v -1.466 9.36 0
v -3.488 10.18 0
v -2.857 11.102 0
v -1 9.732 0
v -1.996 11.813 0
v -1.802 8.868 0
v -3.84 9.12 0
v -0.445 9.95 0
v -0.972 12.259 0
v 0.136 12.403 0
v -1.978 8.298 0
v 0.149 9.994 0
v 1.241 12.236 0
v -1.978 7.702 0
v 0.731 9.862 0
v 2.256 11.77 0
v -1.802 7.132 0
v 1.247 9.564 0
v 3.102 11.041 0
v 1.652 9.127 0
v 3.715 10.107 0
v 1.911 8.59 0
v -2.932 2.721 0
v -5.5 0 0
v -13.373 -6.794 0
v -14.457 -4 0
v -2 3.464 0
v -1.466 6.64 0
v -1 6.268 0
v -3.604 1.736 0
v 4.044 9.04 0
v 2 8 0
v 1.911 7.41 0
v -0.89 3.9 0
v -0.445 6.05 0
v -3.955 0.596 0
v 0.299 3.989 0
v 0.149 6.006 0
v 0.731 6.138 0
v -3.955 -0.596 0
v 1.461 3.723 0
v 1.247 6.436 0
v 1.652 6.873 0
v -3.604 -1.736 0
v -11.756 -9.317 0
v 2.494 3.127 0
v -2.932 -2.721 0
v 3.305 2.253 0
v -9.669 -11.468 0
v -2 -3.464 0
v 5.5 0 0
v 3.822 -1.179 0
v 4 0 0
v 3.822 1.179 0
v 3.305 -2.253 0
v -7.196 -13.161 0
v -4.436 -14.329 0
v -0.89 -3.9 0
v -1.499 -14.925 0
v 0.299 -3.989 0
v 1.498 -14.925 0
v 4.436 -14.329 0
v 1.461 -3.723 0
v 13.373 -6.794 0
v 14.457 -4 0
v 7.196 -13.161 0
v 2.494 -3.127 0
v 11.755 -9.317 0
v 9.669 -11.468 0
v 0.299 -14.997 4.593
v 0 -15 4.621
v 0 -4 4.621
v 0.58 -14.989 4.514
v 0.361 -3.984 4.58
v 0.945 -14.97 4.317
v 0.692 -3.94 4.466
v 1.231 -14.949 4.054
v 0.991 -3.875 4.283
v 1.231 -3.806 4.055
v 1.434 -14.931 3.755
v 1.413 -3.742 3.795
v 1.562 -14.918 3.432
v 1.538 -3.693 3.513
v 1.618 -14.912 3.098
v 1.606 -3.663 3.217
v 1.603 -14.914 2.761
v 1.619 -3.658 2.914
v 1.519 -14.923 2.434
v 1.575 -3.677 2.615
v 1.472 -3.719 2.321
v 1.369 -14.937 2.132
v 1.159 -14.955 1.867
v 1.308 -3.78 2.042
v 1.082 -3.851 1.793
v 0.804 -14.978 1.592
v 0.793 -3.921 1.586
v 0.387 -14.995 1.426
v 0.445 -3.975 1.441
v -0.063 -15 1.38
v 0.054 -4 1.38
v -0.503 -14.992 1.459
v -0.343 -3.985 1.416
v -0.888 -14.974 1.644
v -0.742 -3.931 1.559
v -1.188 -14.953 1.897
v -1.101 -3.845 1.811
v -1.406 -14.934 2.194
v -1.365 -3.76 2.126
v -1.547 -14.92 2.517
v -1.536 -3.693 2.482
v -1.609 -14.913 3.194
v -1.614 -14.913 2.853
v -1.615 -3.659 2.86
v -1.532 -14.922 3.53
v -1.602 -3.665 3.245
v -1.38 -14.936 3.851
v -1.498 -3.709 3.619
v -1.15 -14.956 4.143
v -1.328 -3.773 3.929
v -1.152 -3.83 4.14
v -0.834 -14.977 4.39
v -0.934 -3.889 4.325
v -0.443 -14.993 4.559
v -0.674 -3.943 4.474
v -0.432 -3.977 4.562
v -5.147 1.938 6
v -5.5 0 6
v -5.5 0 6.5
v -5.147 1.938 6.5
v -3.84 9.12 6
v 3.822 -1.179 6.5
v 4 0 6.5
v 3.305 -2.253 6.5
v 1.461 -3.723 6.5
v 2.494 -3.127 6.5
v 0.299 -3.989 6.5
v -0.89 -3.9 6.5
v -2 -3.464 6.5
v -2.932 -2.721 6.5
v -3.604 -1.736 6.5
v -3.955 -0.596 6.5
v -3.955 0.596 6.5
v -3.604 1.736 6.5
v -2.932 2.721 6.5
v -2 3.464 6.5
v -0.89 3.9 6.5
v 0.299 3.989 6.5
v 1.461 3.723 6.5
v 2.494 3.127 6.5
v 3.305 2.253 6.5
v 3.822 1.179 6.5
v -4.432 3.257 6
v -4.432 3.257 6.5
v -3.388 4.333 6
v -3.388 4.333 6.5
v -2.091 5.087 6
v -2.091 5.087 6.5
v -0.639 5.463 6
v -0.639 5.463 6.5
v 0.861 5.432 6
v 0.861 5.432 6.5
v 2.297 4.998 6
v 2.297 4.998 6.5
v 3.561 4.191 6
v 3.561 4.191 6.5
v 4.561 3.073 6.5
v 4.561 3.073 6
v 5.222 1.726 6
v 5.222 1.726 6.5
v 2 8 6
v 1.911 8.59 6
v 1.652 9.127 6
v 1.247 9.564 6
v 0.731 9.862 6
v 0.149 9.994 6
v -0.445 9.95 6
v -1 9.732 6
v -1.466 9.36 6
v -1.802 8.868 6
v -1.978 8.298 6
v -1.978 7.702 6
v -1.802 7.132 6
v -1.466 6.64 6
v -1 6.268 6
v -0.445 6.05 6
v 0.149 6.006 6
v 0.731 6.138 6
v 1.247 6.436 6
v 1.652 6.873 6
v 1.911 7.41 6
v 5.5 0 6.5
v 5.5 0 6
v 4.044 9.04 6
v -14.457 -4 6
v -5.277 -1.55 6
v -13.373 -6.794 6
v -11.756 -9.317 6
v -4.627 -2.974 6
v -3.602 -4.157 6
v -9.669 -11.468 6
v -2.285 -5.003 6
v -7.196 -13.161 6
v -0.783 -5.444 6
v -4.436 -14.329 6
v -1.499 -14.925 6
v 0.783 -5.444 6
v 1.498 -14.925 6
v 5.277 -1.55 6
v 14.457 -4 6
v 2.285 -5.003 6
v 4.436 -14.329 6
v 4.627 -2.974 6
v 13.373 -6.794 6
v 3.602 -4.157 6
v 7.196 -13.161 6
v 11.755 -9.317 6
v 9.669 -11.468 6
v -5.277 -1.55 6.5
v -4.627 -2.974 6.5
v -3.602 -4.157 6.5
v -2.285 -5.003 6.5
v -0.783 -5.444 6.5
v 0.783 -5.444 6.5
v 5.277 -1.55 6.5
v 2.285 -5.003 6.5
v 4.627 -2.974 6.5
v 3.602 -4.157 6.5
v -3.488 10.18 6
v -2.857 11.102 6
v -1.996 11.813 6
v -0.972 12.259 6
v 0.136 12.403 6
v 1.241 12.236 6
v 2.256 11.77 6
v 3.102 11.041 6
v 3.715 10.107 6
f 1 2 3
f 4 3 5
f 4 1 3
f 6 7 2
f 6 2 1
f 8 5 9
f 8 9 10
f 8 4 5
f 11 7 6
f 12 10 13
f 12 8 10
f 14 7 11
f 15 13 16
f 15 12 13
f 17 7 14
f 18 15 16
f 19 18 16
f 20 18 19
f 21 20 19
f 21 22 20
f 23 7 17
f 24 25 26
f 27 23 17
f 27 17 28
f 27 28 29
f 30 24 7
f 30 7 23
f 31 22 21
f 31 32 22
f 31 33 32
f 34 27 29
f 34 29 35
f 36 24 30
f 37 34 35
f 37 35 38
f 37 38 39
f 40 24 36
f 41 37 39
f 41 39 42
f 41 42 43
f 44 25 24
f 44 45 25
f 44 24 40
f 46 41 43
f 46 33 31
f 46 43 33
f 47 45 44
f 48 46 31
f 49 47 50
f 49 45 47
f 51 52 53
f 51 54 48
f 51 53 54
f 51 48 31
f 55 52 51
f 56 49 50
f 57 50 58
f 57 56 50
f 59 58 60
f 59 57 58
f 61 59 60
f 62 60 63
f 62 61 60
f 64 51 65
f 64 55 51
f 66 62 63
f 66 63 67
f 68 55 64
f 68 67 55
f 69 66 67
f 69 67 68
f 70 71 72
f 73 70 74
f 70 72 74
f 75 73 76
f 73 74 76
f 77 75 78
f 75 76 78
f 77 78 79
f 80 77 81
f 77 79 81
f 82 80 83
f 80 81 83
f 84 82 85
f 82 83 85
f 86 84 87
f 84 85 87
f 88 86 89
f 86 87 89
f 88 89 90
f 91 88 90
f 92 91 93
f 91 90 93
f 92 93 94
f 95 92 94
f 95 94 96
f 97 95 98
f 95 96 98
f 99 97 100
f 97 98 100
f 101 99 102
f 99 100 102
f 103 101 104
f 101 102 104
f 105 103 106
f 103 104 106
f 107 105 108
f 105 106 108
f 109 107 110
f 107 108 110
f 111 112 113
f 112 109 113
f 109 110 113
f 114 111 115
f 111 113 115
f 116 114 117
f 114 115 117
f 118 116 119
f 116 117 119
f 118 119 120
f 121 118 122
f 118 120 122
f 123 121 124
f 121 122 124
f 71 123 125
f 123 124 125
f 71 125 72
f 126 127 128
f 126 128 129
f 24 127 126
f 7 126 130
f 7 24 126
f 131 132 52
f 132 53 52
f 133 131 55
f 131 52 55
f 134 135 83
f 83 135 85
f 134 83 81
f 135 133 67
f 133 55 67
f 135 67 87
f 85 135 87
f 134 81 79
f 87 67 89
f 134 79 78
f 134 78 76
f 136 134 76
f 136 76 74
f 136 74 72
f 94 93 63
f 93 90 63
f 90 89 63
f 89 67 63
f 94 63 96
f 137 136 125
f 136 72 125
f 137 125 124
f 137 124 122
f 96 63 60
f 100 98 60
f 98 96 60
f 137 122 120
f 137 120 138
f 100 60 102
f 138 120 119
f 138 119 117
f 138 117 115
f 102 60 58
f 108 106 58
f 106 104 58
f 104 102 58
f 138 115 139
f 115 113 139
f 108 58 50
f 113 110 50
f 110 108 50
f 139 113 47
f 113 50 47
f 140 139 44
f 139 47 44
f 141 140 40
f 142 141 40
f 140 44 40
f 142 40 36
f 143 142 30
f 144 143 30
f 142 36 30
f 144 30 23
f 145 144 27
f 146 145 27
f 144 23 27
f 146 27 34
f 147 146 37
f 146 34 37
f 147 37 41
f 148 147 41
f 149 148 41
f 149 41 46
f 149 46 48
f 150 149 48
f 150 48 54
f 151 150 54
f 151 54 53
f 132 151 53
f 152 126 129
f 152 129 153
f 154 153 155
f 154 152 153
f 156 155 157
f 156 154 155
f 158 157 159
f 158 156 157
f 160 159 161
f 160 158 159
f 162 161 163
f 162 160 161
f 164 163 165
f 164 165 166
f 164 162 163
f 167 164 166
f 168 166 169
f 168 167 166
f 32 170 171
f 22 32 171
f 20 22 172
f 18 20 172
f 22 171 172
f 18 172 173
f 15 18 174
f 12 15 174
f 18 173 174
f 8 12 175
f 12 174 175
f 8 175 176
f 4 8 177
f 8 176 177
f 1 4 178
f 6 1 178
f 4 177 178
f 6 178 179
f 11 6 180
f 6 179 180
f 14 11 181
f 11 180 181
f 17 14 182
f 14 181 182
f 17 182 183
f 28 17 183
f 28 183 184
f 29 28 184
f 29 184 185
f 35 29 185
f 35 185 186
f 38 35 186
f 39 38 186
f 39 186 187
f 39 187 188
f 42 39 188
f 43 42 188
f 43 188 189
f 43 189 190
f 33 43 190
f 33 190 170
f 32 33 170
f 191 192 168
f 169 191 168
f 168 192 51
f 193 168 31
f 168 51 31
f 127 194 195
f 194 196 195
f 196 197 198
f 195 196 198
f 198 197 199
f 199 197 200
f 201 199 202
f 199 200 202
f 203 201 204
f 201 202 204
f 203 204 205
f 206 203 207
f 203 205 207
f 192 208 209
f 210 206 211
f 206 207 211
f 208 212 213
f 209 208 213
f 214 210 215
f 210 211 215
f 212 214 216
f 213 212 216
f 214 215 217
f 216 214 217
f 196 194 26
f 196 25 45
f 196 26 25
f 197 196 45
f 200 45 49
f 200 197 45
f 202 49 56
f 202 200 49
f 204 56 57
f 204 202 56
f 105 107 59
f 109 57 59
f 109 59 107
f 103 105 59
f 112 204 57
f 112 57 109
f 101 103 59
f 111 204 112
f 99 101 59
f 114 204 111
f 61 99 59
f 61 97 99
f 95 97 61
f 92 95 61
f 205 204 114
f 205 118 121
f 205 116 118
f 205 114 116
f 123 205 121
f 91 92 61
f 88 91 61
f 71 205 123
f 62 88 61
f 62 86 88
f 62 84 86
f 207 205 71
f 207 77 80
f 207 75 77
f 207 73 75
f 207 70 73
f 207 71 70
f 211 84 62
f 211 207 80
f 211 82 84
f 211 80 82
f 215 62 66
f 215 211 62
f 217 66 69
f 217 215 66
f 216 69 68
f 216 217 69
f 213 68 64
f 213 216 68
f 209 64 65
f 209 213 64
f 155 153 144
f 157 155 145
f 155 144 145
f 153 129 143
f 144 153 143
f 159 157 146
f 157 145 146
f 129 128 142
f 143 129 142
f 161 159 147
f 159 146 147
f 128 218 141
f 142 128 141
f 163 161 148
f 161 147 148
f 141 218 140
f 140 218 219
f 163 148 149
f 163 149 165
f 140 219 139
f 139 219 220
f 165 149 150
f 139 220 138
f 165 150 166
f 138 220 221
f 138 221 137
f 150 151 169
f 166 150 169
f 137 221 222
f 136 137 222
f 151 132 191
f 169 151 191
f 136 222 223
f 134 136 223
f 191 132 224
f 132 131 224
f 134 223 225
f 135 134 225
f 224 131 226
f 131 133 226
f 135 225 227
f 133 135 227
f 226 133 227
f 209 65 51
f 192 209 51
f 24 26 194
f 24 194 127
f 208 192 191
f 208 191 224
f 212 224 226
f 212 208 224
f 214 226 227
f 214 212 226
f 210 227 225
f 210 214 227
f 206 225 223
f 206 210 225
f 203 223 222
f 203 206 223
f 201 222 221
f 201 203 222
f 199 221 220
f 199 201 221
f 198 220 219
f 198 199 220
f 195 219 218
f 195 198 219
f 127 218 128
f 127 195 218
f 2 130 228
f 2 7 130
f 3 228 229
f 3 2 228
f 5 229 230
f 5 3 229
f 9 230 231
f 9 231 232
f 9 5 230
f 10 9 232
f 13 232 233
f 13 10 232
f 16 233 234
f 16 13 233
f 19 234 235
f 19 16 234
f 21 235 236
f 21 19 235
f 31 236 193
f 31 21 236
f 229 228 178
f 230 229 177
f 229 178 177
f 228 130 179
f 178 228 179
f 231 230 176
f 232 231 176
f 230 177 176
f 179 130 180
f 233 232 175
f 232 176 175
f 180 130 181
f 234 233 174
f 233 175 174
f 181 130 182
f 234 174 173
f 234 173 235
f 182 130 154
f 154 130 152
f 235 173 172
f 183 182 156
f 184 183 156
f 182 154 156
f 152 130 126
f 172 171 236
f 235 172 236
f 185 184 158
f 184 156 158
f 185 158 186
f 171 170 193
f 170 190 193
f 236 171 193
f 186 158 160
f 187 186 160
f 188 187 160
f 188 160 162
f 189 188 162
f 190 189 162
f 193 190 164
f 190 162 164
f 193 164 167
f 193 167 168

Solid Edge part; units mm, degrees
sketch "Sketch1" plane through (0, 0, 0) normal (0, -1, 0) x (1, 0, 0)
  line L0 (4, 0) -> (15, 0)
  line L1 (15, 0) -> (15, 6)
  line L2 (15, 6) -> (5.5, 6)
  line L3 (5.5, 6.5) -> (5.5, 6)
  line L4 (4, 6.5) -> (5.5, 6.5)
  line L5 (4, 6.5) -> (4, 0)
  dimension "D1" = 5.5
  dimension "D2" = 4
  dimension "D3" = 15
  dimension "D4" = 6
  dimension "D5" = 6.5
revolve "RevolvedProtrusion1" add sketch "Sketch1" angle 360 about axis through (0, 0, 6.5) along (0, 0, -1)
sketch "Sketch2" plane through (0, 0, 6) normal (0, 0, 1) x (1, 0, 0)
  line L0 (14.4568, -4) -> (5.5, 0)
  line L1 (5.5, 0) -> (4.0445, 9.0396)
  line L2 (-5.5, 0) -> (-3.84, 9.12)
  line L3 (-14.4568, -4) -> (-5.5, 0)
  line L4 (-14.4568, -4) -> (-19.3107, 1.4462)
  line L5 (-19.3107, 1.4462) -> (-10.4784, 15.4995)
  line L6 (-10.4784, 15.4995) -> (15.0272, 16.6485)
  line L7 (15.0272, 16.6485) -> (21.6119, 7.3238)
  line L8 (21.6119, 7.3238) -> (21.1258, -3.415)
  line L9 (21.1258, -3.415) -> (14.4568, -4)
  arc A0 (4.0445, 9.0396) -> (-3.84, 9.12) centre (0.0953, 8.4037) ccw
  circle A1 centre (0, 8) radius 2
extrude "Cutout1" cut sketch "Sketch2" along normal through all and the other way through all
hole "Bohrung_1" at (0, 0, 3) direction (0, -1, 0) diameter 3.242 end up to next thread major 4 thread length 2
